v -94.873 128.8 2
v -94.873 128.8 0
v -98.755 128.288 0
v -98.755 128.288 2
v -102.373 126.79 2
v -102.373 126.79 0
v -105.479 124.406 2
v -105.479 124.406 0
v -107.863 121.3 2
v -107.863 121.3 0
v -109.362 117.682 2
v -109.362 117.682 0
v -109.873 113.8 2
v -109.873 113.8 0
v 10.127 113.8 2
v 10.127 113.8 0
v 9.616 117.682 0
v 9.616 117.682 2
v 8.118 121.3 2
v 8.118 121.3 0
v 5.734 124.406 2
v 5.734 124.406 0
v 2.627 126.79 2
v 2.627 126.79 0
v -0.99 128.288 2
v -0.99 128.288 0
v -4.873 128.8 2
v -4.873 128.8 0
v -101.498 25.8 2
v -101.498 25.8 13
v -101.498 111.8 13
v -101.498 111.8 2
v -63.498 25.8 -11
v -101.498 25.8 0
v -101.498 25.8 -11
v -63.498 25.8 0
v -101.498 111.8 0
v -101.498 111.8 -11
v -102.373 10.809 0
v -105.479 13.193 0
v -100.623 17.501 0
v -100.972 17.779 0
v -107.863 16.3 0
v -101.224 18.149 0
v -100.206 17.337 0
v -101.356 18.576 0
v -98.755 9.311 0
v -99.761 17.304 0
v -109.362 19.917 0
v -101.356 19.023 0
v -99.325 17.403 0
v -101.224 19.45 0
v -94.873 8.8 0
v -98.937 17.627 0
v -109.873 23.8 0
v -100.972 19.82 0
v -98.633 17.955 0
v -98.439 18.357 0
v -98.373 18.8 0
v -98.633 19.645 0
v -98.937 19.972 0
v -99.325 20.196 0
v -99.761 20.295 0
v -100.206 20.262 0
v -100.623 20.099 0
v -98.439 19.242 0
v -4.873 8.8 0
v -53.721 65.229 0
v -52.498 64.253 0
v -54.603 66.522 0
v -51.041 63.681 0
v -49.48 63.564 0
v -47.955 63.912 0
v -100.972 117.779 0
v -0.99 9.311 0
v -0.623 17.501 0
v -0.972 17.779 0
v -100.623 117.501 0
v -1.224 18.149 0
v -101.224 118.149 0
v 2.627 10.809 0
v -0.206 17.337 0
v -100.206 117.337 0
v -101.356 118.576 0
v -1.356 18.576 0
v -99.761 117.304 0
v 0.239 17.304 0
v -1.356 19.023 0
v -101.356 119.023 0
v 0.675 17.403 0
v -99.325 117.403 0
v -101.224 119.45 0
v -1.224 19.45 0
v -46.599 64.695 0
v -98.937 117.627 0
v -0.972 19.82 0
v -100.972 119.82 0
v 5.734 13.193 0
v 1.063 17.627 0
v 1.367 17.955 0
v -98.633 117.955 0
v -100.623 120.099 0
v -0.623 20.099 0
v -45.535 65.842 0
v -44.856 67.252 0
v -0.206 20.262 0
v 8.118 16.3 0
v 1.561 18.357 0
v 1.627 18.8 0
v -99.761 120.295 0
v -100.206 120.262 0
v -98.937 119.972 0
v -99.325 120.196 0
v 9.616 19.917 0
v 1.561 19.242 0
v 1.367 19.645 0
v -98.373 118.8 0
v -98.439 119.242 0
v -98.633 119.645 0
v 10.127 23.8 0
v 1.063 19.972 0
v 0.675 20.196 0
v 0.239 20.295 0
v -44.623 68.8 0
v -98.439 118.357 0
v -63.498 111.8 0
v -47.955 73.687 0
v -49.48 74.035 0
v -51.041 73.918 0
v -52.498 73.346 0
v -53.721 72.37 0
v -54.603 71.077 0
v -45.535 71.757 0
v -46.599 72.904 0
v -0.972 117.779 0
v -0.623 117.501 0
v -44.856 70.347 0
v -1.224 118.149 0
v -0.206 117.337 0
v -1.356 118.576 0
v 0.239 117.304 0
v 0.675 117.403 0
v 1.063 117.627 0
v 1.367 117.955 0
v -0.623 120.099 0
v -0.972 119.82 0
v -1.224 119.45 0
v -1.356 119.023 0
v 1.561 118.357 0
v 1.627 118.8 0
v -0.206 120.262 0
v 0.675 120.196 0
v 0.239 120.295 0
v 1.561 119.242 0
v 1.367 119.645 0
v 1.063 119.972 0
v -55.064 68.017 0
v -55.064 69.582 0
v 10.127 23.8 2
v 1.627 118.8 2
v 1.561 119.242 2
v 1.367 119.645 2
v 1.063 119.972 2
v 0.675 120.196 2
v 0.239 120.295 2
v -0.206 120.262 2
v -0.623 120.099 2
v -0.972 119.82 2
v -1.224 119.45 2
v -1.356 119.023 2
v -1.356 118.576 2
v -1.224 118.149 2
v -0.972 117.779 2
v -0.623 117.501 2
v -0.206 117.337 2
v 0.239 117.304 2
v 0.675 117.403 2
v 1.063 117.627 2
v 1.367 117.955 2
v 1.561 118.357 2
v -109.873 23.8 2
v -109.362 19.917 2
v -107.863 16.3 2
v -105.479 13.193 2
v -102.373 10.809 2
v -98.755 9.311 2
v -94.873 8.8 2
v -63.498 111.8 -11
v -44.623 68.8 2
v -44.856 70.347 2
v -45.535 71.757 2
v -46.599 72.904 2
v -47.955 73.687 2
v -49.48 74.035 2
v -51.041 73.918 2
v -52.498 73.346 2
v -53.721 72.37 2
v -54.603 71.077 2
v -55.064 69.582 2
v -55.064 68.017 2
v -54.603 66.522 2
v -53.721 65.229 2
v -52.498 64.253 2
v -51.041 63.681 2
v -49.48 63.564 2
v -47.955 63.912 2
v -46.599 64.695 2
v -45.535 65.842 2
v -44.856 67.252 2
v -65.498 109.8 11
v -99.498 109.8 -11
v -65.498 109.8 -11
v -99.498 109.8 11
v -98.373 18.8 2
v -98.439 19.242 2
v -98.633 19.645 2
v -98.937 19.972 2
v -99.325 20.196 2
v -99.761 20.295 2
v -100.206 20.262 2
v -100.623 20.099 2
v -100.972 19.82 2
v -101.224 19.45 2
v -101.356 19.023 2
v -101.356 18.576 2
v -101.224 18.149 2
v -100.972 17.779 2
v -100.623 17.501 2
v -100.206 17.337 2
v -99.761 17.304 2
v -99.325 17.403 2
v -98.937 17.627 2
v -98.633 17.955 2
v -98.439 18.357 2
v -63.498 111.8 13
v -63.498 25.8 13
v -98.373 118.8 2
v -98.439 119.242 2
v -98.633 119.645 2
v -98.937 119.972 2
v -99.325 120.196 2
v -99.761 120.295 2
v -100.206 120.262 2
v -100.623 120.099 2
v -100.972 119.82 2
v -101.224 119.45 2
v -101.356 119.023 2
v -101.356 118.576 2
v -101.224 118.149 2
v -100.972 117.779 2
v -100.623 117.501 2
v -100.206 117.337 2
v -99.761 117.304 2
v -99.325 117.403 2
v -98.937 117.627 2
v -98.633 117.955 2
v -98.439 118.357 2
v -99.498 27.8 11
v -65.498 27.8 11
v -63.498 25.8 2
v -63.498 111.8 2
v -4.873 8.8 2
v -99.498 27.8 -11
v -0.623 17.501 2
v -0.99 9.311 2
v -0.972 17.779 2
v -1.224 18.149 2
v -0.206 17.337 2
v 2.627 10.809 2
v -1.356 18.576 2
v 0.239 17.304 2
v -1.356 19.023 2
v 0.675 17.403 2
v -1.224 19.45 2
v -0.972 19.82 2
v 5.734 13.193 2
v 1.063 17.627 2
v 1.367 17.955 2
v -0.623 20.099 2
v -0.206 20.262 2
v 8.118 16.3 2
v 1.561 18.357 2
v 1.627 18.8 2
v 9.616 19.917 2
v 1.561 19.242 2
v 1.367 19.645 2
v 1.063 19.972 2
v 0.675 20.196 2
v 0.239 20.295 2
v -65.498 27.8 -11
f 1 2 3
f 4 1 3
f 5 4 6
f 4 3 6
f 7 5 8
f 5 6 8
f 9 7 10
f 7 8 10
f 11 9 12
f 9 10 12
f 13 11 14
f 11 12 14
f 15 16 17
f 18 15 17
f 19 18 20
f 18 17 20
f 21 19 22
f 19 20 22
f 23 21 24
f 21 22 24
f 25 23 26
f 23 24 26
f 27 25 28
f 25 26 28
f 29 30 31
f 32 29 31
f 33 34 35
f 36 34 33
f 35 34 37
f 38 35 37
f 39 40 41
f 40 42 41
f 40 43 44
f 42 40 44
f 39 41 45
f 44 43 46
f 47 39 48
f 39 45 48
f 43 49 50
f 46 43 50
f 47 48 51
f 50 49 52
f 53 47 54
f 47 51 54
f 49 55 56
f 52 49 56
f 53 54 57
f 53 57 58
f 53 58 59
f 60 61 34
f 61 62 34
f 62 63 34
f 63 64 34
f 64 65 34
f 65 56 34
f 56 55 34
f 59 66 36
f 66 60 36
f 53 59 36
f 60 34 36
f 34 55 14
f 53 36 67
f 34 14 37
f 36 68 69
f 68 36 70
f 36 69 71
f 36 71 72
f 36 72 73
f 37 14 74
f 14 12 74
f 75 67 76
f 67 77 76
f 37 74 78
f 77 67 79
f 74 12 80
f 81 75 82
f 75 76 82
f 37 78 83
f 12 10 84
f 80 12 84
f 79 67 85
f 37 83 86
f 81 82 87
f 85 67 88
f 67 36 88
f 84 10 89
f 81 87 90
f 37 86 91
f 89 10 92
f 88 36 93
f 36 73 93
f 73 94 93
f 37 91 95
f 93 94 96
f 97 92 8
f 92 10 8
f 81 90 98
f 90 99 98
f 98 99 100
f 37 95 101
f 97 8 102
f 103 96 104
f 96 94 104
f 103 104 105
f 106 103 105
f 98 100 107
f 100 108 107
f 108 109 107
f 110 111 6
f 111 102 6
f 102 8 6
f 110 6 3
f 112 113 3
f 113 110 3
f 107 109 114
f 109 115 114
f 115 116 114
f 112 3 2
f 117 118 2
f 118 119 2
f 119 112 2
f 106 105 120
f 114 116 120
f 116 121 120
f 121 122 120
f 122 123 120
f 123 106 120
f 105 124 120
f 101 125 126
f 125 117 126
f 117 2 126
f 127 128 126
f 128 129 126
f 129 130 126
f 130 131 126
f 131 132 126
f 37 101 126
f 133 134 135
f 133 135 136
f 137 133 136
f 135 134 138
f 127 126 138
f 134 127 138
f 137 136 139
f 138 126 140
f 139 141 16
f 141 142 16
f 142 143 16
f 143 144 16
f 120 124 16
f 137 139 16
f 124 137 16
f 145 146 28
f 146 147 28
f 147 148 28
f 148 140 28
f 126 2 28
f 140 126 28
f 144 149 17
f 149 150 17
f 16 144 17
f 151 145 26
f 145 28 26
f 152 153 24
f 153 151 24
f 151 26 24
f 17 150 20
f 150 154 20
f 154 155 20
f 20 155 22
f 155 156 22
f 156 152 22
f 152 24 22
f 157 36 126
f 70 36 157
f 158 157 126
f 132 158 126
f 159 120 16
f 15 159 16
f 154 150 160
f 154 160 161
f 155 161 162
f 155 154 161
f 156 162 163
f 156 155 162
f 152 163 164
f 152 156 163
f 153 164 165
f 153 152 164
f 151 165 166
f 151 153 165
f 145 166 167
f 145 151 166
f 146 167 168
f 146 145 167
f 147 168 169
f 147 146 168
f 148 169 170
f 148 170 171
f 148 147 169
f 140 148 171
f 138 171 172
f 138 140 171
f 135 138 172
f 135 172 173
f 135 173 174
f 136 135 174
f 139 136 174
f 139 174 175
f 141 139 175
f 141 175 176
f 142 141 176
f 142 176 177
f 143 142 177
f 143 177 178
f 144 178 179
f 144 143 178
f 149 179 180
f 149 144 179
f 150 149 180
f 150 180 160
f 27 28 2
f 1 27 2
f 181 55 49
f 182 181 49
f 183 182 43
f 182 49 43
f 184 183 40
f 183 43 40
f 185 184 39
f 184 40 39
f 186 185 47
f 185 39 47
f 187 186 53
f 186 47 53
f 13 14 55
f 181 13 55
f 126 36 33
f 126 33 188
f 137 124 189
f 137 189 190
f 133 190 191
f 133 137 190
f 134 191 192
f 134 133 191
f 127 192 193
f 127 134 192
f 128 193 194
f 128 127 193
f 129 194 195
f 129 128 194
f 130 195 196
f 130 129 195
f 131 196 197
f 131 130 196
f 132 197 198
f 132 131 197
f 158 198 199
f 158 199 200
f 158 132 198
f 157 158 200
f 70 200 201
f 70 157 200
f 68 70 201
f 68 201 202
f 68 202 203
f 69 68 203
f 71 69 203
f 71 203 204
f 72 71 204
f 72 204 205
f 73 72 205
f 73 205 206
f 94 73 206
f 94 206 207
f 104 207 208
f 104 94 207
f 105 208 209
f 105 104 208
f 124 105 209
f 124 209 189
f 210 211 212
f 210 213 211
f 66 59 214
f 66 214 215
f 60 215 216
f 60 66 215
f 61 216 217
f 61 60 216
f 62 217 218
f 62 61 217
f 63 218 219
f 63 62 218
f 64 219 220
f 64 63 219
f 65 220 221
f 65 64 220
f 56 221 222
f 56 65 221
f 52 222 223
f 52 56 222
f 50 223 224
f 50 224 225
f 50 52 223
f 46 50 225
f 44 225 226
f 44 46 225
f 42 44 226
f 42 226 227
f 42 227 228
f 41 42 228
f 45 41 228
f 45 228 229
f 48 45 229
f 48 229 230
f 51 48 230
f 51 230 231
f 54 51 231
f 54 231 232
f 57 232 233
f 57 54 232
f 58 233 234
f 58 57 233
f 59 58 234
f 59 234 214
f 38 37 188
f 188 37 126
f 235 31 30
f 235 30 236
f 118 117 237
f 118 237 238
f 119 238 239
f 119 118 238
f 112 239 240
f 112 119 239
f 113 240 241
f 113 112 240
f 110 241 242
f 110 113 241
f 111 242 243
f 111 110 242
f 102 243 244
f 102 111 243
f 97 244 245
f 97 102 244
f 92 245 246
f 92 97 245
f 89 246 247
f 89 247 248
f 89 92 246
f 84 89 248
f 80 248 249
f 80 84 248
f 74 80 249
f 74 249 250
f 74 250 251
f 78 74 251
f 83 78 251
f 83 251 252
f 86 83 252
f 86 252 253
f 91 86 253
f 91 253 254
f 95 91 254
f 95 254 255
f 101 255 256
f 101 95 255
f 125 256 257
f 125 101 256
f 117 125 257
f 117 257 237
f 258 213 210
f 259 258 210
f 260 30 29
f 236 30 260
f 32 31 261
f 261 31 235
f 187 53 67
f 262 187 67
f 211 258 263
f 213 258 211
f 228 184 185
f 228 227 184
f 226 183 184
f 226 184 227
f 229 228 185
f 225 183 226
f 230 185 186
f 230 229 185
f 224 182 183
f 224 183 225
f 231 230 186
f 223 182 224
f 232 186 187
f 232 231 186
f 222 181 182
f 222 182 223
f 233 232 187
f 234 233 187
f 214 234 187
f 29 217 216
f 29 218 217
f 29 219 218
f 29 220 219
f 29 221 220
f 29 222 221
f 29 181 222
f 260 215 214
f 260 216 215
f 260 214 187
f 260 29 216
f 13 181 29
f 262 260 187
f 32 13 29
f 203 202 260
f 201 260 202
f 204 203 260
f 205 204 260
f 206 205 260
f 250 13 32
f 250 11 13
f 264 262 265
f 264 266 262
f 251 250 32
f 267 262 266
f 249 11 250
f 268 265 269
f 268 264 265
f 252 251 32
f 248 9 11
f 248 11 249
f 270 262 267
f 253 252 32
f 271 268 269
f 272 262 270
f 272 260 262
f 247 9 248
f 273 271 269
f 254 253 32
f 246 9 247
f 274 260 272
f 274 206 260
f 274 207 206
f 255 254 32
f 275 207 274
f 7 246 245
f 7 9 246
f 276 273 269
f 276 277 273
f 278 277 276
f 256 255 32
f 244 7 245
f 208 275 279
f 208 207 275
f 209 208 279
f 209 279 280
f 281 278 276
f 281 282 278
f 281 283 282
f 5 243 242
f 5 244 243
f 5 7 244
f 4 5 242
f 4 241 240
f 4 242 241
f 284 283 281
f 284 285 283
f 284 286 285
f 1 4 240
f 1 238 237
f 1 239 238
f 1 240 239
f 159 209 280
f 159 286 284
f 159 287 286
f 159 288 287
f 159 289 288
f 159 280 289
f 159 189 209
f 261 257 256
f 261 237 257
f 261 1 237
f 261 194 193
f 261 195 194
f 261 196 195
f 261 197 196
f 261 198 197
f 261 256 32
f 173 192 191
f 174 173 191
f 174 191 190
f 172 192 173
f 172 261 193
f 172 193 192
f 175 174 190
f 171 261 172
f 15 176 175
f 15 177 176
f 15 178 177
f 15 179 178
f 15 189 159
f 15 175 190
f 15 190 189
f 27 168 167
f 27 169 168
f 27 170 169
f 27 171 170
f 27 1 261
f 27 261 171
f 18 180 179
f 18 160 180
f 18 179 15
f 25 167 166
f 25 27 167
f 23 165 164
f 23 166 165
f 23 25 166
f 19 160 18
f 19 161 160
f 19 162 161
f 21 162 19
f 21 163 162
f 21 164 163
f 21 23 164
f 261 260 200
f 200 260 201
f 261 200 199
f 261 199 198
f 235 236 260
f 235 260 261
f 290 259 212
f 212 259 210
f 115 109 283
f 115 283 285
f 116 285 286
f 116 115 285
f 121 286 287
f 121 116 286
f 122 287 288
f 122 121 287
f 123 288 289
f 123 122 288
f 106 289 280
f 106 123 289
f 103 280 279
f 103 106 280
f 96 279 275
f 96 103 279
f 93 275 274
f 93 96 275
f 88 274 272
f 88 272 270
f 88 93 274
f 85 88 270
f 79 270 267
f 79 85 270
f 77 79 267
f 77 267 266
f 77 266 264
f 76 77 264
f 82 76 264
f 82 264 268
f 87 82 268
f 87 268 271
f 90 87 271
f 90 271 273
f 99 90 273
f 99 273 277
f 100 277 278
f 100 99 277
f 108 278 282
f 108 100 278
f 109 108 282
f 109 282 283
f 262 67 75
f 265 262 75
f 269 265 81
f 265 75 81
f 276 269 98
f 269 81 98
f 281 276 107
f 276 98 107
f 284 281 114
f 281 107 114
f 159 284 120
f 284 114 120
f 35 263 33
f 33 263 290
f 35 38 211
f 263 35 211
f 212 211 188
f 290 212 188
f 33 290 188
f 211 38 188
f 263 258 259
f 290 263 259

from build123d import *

# Parameters (mm, degrees)
F2_W     = 38
F2_H     = 86
F2_W_2   = 34
F2_H_2   = 82
F3_DEPTH = 13
F4_DEPTH = 11
F5_DEPTH = 11
F2_R     = 1.5
F2_R_2   = 5.25
F6_DEPTH = 2


with BuildPart() as f3:
    # F2 (on Top) → F3 (new body)
    with BuildSketch(Plane.XY):
        with Locations((-82.4976554215, 68.799585104)):
            Rectangle(F2_W, F2_H)
        with Locations((-82.4976554215, 68.799585104)):
            Rectangle(F2_W_2, F2_H_2, mode=Mode.SUBTRACT)
        with Locations((-82.4976554215, 68.799585104)):
            Rectangle(F2_W_2, F2_H_2)
    extrude(amount=F3_DEPTH)

    # F2 (on Top) → F4 (cut)
    with BuildSketch(Plane.XY):
        with Locations((-82.4976554215, 68.799585104)):
            Rectangle(F2_W_2, F2_H_2)
    extrude(amount=F4_DEPTH, mode=Mode.SUBTRACT)

    # F2 (on Top) → F5 (join)
    with BuildSketch(Plane.XY):
        with Locations((-82.4976554215, 68.799585104)):
            Rectangle(F2_W, F2_H)
        with Locations((-82.4976554215, 68.799585104)):
            Rectangle(F2_W_2, F2_H_2, mode=Mode.SUBTRACT)
    extrude(amount=-F5_DEPTH)

    # F2 (on Top) → F6 (join)
    with BuildSketch(Plane.XY):
        with BuildLine():
            Line((-94.8726554215, 8.799585104), (-4.8726554215, 8.799585104))
            ThreePointArc((-4.8726554215, 8.799585104), (5.7339462963, 13.1929833862), (10.1273445785, 23.799585104))
            Line((10.1273445785, 23.799585104), (10.1273445785, 113.799585104))
            ThreePointArc((10.1273445785, 113.799585104), (5.7339462963, 124.4061868218), (-4.8726554215, 128.799585104))
            Line((-4.8726554215, 128.799585104), (-94.8726554215, 128.799585104))
            ThreePointArc((-94.8726554215, 128.799585104), (-105.4792571393, 124.4061868218), (-109.8726554215, 113.799585104))
            Line((-109.8726554215, 113.799585104), (-109.8726554215, 23.799585104))
            ThreePointArc((-109.8726554215, 23.799585104), (-105.4792571393, 13.1929833862), (-94.8726554215, 8.799585104))
        make_face()
        with Locations((-99.8726554215, 18.799585104)):
            Circle(F2_R, mode=Mode.SUBTRACT)
        with Locations((0.1273445785, 18.799585104)):
            Circle(F2_R, mode=Mode.SUBTRACT)
        with Locations((-82.4976554215, 68.799585104)):
            Rectangle(F2_W, F2_H, mode=Mode.SUBTRACT)
        with Locations((-49.8726554215, 68.799585104)):
            Circle(F2_R_2, mode=Mode.SUBTRACT)
        with Locations((-99.8726554215, 118.799585104)):
            Circle(F2_R, mode=Mode.SUBTRACT)
        with Locations((0.1273445785, 118.799585104)):
            Circle(F2_R, mode=Mode.SUBTRACT)
    extrude(amount=F6_DEPTH)


solid = f3.part
